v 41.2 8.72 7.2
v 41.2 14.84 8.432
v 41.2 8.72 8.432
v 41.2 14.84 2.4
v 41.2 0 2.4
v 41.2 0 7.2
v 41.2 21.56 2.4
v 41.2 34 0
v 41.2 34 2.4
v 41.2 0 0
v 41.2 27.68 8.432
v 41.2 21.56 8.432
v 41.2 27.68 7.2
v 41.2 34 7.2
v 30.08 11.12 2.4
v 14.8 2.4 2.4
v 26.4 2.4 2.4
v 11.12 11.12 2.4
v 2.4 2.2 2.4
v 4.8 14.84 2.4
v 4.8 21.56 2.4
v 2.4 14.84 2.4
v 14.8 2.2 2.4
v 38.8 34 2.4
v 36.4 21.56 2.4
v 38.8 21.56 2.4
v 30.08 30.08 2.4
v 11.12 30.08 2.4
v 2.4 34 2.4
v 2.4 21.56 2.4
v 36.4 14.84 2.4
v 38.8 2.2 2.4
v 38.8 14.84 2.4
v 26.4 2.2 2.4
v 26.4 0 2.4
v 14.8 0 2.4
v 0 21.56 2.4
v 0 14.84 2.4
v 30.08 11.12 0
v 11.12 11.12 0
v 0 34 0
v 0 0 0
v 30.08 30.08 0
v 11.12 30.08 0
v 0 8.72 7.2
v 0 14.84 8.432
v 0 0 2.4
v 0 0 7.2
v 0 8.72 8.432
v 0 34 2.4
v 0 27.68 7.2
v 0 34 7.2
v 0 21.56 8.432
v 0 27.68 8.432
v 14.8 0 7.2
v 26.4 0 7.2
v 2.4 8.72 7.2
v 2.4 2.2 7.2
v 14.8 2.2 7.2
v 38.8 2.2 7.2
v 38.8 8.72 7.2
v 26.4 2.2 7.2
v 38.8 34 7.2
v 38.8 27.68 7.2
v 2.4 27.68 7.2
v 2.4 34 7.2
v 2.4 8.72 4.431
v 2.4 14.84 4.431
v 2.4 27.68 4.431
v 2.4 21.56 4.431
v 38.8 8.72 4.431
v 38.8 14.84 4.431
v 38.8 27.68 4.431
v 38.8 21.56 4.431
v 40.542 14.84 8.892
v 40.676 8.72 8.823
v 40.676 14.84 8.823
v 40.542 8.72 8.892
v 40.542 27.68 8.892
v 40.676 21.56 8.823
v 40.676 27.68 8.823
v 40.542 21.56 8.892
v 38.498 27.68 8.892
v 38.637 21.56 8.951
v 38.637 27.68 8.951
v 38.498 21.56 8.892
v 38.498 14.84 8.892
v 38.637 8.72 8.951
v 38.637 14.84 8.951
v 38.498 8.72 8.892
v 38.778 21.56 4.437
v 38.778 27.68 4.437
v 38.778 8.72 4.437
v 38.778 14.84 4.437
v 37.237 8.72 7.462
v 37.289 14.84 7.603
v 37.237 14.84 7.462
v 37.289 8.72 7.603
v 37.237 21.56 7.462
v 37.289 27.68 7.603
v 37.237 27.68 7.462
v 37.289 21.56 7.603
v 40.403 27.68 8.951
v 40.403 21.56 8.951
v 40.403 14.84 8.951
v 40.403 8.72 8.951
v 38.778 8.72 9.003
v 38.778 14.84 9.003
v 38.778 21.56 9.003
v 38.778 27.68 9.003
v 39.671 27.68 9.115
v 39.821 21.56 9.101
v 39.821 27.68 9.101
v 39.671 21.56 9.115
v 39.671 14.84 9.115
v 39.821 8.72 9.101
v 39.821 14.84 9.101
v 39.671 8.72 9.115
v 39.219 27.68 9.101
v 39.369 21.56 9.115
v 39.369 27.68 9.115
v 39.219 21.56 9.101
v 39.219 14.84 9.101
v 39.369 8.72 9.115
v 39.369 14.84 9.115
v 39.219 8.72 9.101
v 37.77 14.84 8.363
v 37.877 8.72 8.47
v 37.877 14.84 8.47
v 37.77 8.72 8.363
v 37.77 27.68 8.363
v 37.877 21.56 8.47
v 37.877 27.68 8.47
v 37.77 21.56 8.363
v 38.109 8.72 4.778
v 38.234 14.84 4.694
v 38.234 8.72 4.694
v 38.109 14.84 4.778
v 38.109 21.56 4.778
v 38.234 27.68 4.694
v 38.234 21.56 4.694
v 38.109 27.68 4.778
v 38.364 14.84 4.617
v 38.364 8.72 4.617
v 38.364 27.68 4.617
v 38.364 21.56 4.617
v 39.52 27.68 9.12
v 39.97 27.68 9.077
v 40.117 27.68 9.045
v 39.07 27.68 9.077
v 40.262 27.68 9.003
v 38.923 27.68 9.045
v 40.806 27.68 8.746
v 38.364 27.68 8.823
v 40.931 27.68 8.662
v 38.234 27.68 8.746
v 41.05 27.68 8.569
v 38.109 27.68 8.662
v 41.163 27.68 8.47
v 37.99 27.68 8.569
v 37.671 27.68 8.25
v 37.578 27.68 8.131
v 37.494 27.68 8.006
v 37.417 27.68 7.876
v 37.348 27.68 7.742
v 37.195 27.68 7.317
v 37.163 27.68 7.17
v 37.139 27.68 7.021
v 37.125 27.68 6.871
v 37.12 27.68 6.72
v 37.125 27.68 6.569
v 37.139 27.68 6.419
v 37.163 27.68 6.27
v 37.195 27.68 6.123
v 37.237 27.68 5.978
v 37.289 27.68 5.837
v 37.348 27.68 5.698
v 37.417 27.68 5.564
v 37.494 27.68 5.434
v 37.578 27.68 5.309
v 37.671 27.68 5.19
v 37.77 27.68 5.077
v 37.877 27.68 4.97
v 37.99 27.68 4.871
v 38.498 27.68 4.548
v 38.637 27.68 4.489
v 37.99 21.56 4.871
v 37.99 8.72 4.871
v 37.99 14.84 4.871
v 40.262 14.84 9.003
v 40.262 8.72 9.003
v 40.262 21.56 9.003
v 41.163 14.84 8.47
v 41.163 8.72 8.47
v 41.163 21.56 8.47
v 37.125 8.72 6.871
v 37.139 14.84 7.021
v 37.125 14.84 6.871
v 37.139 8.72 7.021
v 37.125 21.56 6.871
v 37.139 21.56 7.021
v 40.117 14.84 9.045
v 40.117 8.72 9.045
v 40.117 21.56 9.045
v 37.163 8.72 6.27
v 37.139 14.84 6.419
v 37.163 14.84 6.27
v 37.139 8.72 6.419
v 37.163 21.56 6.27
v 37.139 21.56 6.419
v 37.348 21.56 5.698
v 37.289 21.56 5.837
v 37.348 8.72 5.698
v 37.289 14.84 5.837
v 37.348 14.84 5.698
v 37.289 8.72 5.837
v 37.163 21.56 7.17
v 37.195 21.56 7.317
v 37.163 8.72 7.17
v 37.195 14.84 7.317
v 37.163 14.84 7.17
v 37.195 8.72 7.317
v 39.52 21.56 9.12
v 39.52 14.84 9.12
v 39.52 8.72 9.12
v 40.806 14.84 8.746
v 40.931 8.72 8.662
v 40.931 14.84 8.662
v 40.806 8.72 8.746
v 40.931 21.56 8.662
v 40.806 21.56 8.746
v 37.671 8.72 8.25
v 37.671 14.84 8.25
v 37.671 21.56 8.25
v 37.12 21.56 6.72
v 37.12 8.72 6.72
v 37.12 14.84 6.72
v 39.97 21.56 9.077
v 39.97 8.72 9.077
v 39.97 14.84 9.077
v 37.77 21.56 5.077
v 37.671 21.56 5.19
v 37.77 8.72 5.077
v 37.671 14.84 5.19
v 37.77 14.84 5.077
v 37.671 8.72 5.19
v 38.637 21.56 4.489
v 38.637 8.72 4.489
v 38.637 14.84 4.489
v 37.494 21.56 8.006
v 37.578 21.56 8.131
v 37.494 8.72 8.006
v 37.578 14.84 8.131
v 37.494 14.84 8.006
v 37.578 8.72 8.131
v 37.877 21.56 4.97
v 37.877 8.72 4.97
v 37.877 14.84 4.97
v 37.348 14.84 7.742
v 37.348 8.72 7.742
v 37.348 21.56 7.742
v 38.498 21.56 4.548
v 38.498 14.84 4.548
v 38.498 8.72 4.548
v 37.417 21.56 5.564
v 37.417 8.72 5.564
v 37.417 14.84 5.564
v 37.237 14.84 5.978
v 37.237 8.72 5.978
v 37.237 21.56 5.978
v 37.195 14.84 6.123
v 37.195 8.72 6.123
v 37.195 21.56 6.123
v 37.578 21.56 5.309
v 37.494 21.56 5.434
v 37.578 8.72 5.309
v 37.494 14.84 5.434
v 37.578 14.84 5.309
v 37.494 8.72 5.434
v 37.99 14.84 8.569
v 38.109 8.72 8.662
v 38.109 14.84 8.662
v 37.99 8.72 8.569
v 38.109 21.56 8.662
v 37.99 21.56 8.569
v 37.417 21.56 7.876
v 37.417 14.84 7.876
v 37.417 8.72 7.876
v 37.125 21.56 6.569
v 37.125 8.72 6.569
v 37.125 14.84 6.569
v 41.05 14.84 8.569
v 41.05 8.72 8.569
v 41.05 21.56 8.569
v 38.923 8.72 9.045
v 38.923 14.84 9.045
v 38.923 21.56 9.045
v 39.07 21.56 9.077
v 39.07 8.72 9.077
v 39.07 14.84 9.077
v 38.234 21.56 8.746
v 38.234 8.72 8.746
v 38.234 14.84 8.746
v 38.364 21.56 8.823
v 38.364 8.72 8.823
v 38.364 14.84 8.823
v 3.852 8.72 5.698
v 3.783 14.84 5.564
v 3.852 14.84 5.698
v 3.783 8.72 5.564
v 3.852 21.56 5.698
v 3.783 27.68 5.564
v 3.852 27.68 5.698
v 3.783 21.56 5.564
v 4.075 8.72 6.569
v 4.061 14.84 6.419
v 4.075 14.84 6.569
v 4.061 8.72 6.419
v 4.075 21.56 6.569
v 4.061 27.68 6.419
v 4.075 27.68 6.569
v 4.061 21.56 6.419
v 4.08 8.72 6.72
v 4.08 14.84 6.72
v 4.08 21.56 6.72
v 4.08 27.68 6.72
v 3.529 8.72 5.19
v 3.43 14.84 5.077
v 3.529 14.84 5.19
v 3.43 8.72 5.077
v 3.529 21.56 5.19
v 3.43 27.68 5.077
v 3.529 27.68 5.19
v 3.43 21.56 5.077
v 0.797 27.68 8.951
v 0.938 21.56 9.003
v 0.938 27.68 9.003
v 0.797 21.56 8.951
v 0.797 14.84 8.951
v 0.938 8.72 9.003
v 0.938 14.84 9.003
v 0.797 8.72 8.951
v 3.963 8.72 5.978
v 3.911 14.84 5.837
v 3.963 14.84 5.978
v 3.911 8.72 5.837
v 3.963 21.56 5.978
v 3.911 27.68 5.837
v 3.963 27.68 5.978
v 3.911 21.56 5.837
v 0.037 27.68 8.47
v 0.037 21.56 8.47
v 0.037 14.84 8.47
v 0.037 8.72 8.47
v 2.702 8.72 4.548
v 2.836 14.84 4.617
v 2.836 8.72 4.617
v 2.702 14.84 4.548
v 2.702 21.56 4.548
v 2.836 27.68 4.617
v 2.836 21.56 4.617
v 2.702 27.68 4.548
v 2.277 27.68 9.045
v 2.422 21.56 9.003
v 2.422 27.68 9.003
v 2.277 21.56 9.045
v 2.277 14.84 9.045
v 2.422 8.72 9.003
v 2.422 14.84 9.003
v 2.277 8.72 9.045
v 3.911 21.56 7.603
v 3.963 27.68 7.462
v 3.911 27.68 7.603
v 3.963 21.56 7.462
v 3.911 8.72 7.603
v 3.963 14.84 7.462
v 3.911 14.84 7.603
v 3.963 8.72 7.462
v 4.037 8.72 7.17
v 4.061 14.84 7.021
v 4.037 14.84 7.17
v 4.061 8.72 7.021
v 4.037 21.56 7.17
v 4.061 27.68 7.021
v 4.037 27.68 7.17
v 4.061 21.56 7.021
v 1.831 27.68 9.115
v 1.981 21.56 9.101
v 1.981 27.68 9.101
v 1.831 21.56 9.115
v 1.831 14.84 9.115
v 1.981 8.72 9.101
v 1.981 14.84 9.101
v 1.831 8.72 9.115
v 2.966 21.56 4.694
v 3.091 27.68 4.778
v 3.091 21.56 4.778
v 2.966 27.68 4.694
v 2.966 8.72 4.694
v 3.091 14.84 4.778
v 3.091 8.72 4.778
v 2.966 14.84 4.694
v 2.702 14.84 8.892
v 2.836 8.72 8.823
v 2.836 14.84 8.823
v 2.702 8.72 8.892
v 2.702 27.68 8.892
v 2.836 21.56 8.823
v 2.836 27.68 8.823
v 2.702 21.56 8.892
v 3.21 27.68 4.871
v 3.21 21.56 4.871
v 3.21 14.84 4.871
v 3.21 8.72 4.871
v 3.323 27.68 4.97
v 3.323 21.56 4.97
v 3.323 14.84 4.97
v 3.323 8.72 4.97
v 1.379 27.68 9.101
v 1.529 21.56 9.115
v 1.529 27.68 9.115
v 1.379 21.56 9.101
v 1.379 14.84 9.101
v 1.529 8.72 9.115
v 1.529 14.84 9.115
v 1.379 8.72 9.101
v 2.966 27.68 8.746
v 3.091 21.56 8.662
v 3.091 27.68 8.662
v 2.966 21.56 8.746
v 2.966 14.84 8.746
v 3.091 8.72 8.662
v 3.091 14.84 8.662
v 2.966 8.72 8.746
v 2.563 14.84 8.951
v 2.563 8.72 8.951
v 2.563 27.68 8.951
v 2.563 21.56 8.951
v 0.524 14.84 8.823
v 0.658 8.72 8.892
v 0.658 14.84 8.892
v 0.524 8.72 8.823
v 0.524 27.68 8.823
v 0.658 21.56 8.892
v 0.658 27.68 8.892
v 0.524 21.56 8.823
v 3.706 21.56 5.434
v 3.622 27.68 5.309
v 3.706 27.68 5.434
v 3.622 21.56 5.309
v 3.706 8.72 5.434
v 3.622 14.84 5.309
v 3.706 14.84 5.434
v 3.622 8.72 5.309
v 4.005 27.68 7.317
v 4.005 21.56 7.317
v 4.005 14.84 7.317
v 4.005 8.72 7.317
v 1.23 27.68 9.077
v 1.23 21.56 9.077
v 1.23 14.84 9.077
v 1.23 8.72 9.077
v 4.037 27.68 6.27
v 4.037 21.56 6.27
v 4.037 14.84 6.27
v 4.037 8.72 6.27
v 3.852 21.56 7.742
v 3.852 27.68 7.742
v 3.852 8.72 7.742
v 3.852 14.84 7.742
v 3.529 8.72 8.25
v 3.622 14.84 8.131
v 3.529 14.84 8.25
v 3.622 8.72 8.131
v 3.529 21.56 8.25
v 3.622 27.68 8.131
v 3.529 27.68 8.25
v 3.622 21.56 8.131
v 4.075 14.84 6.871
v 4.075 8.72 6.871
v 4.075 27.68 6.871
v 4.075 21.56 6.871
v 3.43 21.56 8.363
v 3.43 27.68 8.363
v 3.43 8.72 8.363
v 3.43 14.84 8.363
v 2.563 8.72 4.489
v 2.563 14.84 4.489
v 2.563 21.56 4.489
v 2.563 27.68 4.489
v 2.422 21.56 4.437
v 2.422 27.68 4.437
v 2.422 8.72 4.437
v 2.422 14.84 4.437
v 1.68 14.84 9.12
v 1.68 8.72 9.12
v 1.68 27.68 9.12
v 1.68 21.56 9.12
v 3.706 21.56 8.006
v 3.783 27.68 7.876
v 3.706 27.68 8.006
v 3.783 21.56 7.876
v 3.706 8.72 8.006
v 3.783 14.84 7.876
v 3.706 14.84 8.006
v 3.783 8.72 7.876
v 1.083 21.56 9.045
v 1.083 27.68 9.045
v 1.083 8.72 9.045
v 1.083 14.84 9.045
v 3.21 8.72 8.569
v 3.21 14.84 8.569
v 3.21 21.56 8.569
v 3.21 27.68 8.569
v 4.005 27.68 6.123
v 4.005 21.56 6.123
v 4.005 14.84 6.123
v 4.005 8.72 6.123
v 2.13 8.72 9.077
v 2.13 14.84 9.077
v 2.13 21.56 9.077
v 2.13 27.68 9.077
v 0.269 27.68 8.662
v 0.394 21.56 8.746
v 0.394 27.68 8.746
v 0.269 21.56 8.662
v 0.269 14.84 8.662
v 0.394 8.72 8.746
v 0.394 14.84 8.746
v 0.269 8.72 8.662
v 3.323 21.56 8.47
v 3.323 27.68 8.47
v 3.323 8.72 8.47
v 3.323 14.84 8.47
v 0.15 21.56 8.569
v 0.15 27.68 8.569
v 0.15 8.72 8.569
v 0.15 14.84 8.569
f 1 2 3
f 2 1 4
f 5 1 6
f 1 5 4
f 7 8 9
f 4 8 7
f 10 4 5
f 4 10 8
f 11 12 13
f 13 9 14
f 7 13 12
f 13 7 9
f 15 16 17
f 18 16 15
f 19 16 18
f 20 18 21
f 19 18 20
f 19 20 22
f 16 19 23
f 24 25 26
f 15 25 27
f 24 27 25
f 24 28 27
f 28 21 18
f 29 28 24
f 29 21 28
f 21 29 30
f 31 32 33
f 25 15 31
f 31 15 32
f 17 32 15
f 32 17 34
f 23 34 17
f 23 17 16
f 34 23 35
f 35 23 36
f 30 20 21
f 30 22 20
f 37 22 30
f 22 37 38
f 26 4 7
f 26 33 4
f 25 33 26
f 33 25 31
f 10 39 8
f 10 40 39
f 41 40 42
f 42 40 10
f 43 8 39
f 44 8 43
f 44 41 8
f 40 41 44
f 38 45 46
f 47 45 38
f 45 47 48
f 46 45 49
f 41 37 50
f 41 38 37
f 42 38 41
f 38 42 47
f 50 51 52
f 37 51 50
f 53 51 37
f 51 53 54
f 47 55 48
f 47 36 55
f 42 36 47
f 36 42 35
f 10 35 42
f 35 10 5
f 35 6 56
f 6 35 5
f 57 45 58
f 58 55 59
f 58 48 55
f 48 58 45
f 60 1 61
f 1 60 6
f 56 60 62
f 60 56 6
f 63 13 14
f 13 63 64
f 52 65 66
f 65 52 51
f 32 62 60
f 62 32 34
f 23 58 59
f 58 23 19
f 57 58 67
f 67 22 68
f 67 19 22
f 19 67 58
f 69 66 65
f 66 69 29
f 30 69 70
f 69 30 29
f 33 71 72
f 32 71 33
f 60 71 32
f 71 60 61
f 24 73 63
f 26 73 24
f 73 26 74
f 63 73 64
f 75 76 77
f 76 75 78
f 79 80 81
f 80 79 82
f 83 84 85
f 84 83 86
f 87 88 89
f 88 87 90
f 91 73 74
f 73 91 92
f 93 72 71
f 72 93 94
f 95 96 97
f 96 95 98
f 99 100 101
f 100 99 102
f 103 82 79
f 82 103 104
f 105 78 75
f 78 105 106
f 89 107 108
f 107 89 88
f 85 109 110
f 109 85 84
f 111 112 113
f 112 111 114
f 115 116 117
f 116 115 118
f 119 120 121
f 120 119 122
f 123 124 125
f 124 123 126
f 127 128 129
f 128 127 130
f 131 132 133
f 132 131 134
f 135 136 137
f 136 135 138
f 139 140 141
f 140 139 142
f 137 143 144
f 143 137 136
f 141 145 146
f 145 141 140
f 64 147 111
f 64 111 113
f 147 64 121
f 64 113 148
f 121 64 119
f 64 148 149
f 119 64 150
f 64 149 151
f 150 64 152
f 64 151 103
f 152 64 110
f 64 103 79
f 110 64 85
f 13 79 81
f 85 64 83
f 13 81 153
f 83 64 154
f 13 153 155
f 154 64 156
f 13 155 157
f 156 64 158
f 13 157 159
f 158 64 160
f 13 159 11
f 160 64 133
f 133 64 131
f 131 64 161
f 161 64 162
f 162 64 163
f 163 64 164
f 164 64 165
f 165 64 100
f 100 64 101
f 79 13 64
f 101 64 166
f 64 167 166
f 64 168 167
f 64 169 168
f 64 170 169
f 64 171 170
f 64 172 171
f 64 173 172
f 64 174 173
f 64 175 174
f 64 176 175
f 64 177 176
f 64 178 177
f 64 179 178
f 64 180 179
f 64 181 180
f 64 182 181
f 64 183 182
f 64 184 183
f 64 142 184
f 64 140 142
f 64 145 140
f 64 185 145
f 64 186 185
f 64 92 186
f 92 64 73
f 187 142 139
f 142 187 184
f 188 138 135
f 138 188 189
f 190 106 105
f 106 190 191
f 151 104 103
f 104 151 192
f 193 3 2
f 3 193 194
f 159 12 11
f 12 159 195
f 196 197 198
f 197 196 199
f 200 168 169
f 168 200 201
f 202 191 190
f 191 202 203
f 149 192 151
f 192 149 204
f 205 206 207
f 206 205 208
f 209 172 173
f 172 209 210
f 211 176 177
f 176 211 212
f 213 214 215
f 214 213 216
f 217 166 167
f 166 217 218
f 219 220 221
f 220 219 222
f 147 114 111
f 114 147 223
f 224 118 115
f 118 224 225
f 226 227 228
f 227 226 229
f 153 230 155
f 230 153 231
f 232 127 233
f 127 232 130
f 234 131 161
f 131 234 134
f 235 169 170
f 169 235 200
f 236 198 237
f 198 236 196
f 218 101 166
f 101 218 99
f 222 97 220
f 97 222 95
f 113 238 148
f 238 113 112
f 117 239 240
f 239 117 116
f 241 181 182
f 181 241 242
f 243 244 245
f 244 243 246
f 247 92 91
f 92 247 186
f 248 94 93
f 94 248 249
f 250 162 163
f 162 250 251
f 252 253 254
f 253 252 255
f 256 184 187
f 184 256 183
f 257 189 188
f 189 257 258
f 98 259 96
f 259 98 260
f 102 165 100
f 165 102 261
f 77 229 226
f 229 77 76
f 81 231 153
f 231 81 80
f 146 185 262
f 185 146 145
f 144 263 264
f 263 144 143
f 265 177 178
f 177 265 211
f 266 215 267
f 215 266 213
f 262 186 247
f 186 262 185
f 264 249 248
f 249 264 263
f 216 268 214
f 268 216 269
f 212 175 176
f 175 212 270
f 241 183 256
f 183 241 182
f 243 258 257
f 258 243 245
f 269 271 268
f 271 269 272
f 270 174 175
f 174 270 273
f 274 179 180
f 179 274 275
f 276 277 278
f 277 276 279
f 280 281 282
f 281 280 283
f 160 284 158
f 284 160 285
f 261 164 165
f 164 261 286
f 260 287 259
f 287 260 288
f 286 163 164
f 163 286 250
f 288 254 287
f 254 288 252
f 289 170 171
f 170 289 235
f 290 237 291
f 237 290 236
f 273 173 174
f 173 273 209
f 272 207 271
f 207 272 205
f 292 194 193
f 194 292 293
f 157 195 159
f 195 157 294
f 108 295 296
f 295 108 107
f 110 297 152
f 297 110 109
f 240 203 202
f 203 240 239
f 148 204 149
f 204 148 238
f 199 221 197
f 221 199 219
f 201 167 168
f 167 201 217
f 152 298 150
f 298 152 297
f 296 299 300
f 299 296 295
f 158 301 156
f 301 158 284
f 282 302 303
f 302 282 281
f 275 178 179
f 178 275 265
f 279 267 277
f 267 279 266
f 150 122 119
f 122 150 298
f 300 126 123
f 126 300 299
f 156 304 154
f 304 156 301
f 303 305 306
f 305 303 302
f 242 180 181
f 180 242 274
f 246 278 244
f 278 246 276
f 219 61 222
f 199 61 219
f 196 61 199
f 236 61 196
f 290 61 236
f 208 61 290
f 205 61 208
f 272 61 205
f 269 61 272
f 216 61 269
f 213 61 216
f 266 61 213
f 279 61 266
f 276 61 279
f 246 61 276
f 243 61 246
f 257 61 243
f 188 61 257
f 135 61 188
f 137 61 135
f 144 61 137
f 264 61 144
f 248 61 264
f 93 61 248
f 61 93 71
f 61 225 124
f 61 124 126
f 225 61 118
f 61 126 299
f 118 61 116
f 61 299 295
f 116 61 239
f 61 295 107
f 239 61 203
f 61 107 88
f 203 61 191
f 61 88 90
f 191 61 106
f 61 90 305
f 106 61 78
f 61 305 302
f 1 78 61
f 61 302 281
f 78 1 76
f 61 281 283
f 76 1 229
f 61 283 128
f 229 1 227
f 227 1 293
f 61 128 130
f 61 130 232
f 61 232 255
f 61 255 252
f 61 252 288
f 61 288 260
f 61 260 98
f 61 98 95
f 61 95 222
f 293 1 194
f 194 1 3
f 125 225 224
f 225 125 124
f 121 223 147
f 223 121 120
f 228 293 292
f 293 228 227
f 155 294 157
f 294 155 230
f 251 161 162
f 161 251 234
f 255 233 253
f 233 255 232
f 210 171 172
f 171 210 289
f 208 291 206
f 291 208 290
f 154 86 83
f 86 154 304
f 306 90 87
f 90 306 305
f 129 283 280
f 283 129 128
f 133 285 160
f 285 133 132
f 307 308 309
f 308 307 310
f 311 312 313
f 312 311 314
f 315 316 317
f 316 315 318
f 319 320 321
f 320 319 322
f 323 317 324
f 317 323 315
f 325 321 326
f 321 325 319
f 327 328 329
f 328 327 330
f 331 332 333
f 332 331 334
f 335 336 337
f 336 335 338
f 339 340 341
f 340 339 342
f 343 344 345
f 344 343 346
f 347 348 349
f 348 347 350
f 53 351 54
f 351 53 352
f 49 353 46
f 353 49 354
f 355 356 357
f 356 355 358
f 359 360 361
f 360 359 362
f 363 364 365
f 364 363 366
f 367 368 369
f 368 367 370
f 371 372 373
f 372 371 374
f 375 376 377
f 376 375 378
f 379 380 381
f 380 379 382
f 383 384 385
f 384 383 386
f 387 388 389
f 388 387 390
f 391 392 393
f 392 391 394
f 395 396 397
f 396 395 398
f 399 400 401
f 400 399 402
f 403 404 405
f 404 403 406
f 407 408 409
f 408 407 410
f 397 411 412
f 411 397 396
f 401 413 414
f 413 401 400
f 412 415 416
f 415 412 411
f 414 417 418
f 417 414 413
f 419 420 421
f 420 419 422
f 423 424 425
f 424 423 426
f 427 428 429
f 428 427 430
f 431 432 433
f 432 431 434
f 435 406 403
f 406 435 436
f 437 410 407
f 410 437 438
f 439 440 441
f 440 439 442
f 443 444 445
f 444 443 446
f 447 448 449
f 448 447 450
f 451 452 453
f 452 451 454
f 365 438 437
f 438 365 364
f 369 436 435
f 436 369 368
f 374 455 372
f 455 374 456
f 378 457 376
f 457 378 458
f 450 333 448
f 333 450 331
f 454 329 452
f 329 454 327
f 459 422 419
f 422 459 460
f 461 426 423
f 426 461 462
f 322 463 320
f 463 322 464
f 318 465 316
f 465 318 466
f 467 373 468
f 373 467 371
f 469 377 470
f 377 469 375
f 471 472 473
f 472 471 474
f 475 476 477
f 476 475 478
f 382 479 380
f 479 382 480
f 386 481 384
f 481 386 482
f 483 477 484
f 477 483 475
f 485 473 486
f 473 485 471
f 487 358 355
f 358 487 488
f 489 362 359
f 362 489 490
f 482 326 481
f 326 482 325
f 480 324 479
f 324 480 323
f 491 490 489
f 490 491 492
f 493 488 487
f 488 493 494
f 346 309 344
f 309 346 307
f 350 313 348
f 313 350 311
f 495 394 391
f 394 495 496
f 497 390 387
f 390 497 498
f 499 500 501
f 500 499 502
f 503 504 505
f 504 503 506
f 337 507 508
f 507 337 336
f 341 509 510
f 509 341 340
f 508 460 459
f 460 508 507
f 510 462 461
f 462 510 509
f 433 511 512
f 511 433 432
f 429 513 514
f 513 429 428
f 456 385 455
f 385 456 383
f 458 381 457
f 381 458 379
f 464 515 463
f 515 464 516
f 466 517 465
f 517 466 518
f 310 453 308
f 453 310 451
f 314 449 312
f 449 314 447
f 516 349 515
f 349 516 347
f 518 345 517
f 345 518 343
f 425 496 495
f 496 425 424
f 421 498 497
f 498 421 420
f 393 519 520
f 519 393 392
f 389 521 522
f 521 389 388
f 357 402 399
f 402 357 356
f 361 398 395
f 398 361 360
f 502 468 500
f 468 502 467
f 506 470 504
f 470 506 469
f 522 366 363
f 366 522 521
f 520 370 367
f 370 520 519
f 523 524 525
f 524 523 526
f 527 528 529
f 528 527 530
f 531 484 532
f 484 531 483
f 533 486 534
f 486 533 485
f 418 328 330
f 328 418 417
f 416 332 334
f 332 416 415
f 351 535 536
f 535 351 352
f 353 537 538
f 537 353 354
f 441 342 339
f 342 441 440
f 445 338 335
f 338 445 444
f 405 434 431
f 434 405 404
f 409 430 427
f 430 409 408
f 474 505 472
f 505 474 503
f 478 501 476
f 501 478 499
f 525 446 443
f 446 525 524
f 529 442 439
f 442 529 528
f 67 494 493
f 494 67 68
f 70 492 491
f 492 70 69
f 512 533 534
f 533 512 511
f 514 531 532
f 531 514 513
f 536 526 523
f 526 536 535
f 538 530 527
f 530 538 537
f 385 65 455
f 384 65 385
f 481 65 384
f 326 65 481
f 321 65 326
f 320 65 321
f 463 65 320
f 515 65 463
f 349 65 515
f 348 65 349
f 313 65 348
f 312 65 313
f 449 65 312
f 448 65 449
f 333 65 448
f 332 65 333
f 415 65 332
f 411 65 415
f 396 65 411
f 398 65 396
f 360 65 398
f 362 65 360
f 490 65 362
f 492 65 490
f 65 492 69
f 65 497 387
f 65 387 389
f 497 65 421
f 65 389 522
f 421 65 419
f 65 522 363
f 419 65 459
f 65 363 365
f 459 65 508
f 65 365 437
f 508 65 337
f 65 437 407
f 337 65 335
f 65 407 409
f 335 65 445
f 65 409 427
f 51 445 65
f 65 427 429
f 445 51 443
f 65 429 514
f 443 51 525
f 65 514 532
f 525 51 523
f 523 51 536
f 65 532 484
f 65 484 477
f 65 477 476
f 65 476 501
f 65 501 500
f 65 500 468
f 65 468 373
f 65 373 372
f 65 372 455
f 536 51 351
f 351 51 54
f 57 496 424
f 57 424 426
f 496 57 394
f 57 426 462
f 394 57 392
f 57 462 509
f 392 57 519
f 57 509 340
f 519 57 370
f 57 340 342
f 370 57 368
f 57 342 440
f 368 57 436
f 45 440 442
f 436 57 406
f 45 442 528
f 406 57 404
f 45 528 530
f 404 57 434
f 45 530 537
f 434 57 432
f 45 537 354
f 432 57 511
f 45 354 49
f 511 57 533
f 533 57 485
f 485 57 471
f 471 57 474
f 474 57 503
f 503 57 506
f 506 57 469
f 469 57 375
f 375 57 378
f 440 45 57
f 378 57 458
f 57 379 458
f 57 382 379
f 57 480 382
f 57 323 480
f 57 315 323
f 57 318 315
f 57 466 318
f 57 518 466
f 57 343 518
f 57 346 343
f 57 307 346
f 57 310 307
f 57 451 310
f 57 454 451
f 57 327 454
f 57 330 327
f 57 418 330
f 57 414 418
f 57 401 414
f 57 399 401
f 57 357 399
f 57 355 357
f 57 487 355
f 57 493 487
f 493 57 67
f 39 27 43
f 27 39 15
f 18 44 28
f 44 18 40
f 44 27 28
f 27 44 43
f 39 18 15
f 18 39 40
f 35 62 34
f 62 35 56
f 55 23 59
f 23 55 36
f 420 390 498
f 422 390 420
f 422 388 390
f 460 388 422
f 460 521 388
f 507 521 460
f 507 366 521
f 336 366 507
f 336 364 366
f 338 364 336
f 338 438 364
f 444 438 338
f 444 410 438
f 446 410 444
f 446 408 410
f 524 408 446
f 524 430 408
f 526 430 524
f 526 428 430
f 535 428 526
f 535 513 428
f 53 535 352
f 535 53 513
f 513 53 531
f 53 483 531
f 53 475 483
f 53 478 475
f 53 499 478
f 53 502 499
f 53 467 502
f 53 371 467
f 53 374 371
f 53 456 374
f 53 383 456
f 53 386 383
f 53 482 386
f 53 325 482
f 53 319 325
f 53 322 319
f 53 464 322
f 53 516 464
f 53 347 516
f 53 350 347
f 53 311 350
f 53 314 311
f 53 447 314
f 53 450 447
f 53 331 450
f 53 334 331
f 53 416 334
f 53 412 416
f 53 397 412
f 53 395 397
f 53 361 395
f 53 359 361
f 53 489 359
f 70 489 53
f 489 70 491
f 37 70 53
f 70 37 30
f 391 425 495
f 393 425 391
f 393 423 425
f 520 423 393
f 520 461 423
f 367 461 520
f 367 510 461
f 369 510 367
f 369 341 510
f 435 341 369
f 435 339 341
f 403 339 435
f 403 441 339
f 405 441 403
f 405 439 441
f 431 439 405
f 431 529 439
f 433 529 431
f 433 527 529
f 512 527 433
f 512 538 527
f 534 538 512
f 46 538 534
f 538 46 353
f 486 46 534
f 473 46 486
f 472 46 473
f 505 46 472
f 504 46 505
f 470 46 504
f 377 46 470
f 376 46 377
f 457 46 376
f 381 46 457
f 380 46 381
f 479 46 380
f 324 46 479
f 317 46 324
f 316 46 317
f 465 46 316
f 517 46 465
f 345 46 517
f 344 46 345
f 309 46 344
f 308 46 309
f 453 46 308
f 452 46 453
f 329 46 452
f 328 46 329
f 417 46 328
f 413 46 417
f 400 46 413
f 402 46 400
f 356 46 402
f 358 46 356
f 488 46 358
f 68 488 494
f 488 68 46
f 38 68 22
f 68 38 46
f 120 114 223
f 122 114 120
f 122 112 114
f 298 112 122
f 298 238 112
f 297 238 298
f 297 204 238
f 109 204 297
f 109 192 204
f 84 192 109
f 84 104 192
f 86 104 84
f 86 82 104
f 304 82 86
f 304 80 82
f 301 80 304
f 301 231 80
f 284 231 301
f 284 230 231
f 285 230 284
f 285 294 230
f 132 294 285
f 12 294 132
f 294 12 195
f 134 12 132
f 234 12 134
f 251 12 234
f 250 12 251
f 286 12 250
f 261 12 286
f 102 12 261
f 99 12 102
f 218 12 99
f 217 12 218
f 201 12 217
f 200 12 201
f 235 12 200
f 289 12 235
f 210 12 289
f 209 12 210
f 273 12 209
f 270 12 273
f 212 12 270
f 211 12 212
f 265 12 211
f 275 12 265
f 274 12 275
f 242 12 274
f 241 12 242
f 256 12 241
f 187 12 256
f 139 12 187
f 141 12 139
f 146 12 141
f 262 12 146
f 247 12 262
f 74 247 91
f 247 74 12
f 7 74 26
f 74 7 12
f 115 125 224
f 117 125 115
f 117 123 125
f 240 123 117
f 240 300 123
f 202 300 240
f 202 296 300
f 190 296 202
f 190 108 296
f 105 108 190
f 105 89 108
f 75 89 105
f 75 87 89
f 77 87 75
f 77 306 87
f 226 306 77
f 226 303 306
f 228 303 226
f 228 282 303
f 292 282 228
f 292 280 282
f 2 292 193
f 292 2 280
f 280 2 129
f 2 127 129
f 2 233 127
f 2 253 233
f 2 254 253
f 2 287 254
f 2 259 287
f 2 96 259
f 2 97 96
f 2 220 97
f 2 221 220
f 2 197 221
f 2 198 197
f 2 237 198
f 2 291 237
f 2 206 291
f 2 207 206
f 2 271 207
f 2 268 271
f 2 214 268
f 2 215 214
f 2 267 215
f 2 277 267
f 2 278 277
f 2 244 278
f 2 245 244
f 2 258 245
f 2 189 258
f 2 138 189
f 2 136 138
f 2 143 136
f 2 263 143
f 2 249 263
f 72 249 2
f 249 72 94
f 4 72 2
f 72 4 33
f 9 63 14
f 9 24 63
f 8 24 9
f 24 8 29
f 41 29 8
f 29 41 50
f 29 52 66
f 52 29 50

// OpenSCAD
// Written by xoque (mwifall@gmail.com)
/**************************************
Custom Escape organizer lid for treasure tiles
It is cut off on one end to fit the "3 in 1" organizer
**************************************/

ChamberWidth=100;
ChamberHeight=75;
CurseLength=65;
CurseWidth=50;
CurseHeight=50;
TreasureWidth=30.1;
TreasureHeight=40;

lid(TreasureWidth,TreasureWidth,1.5,2.4,5);

module lid(LidWidth,LidLength, tol, Thickness, Edge)
{
    LidWidth=LidWidth+tol;
    LidLength=LidLength+tol;
    
    difference(){
        union(){
            //bottom structure
            cube([LidWidth+4*Thickness,LidLength+4*Thickness,Thickness]);
            
            //bottom and top walls
            translate([0,0,Thickness]) cube([LidWidth+Thickness*4,Thickness-.2,2*Thickness]);
            translate([0,LidLength+3*Thickness+.2,Thickness]) cube([LidWidth+Thickness*4,Thickness-.2,2*Thickness]);
            
            //side walls
            translate([0,0,Thickness]) cube([Thickness,LidLength+Thickness*4,2*Thickness]);
            translate([LidWidth+Thickness*3,0,Thickness]) cube([Thickness,LidLength+Thickness*4,2*Thickness]);

            //cylinders on side walls
            translate([LidWidth+4*Thickness-Thickness*0.7,Thickness+LidLength/5,4.5*Thickness-Thickness*1.7]) rotate([270,0,0]) cylinder($fn = 100, r = Thickness, h = 3*LidLength/5);
            translate([Thickness*0.7,Thickness+LidLength/5,4.5*Thickness-Thickness*1.7]) rotate([270,0,0]) cylinder($fn = 100, r = Thickness, h = 3*LidLength/5);
            }
    //Subtraction
    //hole in middle
    translate([0.2*LidWidth+2*Thickness, 0.2*LidLength+2*Thickness, 0]) cube([0.6*LidWidth, 0.6*LidLength, Thickness]);
    
    //Removing cutouts in top and bottom (non cylinder edges)
    translate([2*Edge+2*Thickness,0,Thickness]) cube([LidWidth-4*Edge,Thickness,2*Thickness]);
    translate([2*Edge+2*Thickness,LidLength+3*Thickness,Thickness]) cube([LidWidth-4*Edge,Thickness,3*Thickness]);

    //Removing cutouts in between cylinders
    translate([0,Thickness+2*LidLength/5-.2,Thickness]) cube([2*Thickness,LidLength/5+.4,3*Thickness]);
    translate([LidWidth+Thickness*2,Thickness+2*LidLength/5-.2,Thickness]) cube([2*Thickness,LidLength/5+.4,3*Thickness]);

    //Removing outside edges of cylinders
    translate([-Thickness,0,Thickness]) cube([Thickness,LidLength+Thickness*4,4*Thickness]);
    translate([LidWidth+Thickness*4,0,Thickness]) cube([Thickness,LidLength+Thickness*4,4*Thickness]);

    translate([0,LidLength+Thickness,0]) cube([LidWidth+4*Thickness,4*Thickness,4*Thickness]);
}
}
